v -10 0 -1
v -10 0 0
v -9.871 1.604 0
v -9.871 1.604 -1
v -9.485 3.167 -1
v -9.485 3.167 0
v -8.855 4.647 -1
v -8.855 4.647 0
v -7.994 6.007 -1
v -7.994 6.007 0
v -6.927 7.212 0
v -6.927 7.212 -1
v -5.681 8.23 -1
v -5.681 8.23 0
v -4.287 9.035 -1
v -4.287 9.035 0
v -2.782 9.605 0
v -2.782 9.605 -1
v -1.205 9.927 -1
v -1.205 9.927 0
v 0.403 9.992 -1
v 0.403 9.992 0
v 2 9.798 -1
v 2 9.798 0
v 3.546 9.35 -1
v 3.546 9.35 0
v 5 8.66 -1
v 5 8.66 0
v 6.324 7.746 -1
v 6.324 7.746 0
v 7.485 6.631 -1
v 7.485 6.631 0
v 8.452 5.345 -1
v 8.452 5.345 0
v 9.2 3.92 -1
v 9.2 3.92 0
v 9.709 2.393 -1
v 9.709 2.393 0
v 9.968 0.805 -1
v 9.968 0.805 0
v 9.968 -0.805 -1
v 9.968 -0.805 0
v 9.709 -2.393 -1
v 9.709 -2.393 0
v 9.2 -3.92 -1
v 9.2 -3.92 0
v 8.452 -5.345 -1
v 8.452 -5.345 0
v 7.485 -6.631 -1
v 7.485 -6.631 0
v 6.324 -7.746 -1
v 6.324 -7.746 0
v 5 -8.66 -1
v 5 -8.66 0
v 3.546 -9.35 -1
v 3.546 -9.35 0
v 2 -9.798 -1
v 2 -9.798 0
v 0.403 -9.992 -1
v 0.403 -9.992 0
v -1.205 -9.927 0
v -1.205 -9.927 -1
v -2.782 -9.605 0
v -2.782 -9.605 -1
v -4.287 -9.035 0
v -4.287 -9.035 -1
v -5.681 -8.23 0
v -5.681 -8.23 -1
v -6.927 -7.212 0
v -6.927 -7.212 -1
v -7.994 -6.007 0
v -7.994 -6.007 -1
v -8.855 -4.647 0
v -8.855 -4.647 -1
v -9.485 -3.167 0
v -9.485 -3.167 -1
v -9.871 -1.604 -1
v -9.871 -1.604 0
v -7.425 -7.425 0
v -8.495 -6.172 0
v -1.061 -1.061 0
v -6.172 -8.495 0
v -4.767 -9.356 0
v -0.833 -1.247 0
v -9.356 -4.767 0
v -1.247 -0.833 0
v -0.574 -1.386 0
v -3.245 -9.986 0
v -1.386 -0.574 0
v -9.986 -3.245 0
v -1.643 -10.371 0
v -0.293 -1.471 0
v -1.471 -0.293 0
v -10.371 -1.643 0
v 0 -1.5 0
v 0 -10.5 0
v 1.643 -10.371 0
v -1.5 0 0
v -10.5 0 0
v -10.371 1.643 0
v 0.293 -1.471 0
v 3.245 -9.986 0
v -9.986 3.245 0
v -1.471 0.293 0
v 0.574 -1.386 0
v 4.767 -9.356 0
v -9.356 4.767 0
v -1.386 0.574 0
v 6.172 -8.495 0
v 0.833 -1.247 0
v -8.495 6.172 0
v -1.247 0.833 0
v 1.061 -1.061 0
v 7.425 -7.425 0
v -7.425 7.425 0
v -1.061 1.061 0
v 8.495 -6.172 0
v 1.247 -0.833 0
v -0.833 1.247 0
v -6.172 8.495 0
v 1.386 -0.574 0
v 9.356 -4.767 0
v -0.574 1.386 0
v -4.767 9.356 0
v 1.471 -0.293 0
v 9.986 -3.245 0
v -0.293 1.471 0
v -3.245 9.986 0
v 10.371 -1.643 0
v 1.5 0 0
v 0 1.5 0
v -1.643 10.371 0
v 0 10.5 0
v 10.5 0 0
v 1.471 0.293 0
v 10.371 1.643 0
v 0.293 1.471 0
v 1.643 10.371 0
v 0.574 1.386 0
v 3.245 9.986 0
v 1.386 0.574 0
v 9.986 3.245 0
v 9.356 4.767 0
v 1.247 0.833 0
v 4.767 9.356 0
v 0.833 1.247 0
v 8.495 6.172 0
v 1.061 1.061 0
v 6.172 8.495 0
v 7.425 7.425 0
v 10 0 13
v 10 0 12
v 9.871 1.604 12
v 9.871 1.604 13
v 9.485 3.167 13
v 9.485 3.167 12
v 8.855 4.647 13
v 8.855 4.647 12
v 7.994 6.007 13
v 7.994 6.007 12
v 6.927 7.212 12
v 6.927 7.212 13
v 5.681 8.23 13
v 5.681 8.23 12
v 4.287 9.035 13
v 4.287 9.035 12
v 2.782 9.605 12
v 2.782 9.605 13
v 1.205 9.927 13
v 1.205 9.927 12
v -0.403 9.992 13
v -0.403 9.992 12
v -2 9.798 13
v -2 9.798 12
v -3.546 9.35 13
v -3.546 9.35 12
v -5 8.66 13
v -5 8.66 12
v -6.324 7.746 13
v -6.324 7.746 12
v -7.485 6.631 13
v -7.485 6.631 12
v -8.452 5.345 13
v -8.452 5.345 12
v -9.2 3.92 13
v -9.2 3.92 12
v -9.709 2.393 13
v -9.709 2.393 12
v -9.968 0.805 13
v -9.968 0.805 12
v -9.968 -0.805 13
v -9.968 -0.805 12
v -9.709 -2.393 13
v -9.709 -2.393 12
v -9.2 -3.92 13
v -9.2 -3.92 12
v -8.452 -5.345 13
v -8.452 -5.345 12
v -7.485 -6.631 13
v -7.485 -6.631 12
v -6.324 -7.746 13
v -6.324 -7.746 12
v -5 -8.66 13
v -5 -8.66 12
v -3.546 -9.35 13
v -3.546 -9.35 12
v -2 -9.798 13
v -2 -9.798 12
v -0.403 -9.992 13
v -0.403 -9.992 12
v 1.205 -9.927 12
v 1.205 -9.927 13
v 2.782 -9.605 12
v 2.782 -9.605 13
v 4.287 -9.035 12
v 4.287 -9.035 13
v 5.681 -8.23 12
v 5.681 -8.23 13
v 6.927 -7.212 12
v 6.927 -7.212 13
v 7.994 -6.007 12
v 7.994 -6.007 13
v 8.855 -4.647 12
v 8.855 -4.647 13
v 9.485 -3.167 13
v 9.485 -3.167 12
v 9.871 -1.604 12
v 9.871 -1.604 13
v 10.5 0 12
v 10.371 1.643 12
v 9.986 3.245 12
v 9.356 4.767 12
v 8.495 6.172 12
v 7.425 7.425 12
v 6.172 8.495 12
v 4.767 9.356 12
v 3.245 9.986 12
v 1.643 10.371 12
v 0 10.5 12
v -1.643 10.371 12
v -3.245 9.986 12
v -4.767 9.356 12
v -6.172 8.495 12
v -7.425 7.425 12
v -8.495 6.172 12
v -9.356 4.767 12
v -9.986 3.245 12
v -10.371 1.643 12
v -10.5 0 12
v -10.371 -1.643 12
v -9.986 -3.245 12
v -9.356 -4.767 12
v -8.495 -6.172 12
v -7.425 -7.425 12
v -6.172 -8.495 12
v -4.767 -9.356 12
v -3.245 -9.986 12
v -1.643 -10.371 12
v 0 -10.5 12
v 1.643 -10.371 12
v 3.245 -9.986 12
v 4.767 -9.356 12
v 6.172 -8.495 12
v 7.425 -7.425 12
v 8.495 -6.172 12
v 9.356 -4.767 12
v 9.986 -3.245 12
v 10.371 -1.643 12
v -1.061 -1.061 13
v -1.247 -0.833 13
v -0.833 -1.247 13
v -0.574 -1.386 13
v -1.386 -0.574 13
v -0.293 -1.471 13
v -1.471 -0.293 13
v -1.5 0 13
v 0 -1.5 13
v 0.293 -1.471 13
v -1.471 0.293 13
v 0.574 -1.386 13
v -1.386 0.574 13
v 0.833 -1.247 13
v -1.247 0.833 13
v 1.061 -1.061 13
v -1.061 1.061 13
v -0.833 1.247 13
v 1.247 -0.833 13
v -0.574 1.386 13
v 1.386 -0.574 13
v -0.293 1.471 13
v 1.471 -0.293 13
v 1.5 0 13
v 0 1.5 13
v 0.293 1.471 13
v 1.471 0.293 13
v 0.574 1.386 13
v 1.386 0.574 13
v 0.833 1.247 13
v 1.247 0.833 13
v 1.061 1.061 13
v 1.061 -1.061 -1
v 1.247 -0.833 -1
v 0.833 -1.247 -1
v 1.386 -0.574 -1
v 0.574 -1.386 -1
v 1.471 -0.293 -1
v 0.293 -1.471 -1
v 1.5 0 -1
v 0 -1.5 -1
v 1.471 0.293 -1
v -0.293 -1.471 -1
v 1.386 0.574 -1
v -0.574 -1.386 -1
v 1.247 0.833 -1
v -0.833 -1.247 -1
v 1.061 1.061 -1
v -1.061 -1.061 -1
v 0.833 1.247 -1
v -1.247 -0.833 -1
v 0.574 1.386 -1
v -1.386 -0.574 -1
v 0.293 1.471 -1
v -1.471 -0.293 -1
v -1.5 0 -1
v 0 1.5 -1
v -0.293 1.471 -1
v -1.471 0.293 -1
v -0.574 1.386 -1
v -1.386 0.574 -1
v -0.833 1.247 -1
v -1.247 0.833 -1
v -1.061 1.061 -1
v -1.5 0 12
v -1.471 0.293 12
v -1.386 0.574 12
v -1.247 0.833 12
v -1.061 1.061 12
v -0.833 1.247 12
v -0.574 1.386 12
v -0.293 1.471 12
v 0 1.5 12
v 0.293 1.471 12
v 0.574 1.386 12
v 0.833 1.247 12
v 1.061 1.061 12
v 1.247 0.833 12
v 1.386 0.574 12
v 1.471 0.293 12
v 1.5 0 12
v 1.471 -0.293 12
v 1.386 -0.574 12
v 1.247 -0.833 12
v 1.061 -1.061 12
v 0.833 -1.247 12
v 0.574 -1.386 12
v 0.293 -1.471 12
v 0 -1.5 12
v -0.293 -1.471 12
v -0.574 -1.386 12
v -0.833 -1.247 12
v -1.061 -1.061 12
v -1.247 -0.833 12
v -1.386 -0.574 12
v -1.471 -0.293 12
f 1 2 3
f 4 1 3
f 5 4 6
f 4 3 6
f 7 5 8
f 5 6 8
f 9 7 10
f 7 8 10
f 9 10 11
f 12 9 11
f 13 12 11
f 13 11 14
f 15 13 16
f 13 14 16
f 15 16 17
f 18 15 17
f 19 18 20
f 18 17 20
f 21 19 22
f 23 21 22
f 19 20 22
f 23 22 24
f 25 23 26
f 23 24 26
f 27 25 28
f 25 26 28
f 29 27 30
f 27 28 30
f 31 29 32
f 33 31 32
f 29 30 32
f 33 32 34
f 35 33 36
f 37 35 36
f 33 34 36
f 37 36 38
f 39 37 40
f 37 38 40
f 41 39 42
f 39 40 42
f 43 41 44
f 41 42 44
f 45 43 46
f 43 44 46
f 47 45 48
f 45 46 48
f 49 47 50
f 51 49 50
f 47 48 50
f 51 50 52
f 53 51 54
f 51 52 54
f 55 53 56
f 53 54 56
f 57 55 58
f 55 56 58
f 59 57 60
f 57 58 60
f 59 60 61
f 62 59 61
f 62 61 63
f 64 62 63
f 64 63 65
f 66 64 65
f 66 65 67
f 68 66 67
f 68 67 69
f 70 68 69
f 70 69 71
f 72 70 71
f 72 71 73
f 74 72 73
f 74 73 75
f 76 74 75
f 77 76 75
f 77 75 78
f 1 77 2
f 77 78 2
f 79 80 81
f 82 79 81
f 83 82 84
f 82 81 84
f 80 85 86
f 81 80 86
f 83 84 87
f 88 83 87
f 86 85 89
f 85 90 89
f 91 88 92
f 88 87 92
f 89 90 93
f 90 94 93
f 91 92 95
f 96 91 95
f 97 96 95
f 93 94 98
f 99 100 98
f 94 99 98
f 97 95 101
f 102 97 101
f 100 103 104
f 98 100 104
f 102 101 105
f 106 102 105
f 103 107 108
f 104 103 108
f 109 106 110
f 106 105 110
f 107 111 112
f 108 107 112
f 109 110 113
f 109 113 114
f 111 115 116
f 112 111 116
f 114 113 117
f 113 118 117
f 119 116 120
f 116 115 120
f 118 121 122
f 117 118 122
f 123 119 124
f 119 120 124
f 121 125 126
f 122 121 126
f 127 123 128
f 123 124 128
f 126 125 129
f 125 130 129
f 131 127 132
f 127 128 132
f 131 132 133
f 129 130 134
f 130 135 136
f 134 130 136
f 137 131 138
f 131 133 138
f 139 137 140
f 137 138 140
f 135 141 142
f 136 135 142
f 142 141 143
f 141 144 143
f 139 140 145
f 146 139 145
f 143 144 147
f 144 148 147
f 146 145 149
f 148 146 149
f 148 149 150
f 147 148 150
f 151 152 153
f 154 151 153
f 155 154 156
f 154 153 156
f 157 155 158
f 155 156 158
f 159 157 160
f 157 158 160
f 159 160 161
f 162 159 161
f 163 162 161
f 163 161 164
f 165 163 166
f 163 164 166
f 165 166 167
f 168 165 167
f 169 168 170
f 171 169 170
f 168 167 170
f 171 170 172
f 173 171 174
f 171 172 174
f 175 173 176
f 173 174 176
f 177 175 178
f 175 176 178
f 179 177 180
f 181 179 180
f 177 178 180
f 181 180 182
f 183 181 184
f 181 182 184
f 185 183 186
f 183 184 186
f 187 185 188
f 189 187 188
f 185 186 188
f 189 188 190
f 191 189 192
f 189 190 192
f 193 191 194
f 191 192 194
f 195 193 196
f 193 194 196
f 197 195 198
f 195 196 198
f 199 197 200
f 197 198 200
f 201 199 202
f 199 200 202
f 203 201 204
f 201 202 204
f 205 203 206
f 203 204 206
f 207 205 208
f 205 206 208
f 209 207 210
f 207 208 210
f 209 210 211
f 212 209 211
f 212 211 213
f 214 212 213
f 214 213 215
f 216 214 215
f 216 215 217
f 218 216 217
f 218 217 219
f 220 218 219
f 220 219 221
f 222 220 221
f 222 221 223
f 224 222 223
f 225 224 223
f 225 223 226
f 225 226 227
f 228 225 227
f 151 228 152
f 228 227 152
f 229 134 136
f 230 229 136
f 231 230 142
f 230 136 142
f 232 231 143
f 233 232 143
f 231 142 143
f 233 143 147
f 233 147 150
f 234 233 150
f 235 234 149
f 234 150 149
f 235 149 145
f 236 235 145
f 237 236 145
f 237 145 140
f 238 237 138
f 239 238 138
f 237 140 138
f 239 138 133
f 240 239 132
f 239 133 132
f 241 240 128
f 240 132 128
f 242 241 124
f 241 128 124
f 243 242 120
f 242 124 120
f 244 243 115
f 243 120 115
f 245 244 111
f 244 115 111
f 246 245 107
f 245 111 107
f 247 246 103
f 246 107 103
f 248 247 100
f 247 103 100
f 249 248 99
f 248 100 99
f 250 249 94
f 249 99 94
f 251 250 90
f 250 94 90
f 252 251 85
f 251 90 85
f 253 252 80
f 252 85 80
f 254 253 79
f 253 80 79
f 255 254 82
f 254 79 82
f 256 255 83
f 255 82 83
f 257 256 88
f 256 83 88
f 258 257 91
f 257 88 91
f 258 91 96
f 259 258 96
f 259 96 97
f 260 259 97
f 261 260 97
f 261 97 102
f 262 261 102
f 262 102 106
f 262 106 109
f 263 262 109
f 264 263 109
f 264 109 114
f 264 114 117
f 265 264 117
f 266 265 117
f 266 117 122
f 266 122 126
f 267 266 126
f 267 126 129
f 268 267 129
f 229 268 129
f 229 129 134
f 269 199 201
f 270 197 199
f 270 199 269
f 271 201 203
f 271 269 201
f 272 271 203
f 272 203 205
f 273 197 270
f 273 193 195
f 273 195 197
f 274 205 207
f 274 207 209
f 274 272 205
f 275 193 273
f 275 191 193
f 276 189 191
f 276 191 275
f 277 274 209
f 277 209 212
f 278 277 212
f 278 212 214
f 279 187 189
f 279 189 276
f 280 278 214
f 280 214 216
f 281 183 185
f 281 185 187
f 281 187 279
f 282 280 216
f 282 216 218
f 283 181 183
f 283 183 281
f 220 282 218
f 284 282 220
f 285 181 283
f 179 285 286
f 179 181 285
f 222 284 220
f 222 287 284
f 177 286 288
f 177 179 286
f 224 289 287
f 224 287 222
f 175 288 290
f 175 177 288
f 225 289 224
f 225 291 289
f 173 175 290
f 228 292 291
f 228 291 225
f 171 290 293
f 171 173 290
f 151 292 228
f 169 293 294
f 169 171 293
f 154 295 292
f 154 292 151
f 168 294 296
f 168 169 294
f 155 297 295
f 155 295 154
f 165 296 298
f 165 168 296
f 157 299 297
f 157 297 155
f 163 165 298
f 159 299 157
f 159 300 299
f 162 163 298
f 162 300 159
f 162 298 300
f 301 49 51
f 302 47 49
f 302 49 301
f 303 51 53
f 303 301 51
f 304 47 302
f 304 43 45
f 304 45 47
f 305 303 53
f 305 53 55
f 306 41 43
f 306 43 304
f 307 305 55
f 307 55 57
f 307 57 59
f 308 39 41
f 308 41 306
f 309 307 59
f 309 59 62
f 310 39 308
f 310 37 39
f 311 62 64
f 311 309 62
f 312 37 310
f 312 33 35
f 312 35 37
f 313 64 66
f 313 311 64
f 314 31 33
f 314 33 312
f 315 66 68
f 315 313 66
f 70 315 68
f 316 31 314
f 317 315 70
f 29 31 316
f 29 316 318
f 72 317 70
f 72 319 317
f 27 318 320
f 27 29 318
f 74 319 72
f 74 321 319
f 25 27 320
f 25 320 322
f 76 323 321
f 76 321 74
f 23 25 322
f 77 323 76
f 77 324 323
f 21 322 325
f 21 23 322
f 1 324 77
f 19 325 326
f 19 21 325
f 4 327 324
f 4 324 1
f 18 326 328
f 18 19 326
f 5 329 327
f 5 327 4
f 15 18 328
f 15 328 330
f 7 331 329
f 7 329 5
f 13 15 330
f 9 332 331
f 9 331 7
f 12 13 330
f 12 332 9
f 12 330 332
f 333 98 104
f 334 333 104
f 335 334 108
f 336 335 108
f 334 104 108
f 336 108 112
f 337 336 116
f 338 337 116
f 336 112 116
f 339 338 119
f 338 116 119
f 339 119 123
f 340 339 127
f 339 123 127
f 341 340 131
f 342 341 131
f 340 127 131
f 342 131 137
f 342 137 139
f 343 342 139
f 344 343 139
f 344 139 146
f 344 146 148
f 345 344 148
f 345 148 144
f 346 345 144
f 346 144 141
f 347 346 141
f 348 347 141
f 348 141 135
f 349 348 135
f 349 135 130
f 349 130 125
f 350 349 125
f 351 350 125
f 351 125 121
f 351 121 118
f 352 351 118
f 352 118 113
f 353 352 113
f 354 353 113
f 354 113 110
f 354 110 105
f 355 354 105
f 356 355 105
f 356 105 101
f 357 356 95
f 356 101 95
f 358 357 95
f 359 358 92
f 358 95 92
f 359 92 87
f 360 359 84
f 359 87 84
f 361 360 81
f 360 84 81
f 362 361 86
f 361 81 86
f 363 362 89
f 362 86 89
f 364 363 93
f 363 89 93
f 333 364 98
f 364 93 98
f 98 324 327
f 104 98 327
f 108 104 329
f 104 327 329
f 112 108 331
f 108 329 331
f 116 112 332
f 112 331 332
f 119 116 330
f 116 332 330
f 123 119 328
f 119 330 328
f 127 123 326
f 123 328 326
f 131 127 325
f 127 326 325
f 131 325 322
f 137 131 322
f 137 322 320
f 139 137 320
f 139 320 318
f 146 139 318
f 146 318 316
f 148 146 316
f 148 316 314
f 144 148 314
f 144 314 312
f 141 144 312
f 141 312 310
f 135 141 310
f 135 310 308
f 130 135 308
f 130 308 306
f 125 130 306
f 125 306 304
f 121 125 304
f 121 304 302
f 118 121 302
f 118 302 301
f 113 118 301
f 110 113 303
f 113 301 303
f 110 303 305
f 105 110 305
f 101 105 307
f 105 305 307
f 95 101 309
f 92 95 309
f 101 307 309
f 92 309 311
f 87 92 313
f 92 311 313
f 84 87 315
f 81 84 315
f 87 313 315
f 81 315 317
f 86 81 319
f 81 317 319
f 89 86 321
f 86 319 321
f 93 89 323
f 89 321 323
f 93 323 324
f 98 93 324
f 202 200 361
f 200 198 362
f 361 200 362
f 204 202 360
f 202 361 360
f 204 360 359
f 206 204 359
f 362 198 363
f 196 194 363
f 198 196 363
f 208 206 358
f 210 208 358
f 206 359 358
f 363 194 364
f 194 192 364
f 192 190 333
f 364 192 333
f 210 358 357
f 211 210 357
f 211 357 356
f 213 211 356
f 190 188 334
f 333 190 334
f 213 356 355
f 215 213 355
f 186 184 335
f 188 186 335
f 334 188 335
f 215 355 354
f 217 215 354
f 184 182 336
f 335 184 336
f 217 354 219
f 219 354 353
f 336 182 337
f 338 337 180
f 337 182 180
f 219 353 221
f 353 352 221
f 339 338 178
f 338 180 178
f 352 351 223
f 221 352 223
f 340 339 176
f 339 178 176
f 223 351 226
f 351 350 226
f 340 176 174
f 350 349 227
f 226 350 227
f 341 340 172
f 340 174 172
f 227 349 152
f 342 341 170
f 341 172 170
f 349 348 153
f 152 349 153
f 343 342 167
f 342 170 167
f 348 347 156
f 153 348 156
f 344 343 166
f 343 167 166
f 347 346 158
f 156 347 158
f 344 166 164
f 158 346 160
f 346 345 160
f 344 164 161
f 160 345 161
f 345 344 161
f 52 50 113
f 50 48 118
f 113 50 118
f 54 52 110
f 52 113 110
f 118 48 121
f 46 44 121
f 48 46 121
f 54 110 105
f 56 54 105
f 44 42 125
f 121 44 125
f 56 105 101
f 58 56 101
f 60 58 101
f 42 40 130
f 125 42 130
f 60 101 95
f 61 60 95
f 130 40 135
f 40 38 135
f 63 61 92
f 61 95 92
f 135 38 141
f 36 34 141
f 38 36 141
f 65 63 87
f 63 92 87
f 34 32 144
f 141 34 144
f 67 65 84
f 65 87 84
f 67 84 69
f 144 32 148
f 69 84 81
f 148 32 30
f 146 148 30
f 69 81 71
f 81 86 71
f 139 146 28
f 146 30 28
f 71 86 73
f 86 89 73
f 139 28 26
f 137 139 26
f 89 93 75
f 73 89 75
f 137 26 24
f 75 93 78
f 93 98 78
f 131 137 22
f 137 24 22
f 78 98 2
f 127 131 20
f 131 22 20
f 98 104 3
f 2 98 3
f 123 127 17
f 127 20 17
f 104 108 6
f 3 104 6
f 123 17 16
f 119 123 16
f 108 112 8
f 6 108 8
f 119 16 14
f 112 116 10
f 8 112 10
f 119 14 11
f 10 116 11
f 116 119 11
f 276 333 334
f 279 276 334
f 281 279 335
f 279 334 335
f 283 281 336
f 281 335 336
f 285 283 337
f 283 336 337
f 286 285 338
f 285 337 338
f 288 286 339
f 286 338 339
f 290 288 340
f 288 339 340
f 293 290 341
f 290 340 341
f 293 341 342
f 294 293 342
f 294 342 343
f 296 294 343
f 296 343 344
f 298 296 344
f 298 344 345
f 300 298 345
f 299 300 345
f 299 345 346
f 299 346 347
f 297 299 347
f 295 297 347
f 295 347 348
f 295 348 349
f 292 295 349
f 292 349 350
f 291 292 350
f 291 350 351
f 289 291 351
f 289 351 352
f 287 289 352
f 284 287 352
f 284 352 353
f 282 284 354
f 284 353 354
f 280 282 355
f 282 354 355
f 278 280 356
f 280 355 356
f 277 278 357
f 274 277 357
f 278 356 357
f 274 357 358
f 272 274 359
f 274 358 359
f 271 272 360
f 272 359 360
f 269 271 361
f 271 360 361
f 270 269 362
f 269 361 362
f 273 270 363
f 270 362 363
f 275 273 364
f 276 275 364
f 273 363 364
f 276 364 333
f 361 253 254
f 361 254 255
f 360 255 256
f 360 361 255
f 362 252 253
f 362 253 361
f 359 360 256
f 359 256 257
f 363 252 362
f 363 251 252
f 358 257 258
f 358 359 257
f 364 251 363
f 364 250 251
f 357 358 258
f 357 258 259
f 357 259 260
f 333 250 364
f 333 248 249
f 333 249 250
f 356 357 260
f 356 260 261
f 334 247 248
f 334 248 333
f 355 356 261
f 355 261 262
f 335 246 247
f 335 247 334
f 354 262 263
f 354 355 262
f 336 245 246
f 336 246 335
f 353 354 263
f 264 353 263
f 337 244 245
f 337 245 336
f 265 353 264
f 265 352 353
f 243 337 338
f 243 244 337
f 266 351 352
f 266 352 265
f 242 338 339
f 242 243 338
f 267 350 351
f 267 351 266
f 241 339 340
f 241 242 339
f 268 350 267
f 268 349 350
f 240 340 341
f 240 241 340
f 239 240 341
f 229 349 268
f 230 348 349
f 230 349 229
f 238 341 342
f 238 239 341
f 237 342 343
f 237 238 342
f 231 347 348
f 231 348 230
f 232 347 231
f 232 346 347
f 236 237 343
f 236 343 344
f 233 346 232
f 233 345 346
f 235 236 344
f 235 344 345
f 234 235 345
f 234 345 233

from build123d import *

# Parameters (mm, degrees)
CROQUIS1_R              = 10.5
SALIENTE_EXTRUIR1_DEPTH = 12
CROQUIS2_R              = 10
SALIENTE_EXTRUIR2_DEPTH = 1
CROQUIS3_R              = 10
SALIENTE_EXTRUIR3_DEPTH = 1
CROQUIS4_R              = 1.5
CORTAR_EXTRUIR1_DEPTH   = 21.408331632


with BuildPart() as part:
    # Croquis1 → Saliente-Extruir1 (new body)
    with BuildSketch(Plane.XY):
        Circle(CROQUIS1_R)
    extrude(amount=SALIENTE_EXTRUIR1_DEPTH)


with BuildPart() as body_2:
    # Croquis2 → Saliente-Extruir2 (new body)
    with BuildSketch(Plane.XY.offset(12)):
        Circle(CROQUIS2_R)
    extrude(amount=SALIENTE_EXTRUIR2_DEPTH)


with BuildPart() as body_3:
    # Croquis3 → Saliente-Extruir3 (new body)
    with BuildSketch(Plane(origin=(0, 0, 0), x_dir=(-1, 0, 0), z_dir=(0, 0, -1))):
        Circle(CROQUIS3_R)
    extrude(amount=SALIENTE_EXTRUIR3_DEPTH)


with BuildPart() as cortar_extruir1_tool:
    # Croquis4 → Cortar-Extruir1 (new, through all)
    with BuildSketch(Plane(origin=(0, 0, -1), x_dir=(-1, 0, 0), z_dir=(0, 0, -1))):
        Circle(CROQUIS4_R)
    extrude(amount=-CORTAR_EXTRUIR1_DEPTH)


with BuildPart() as part_1:
    add(part.part)

    # Cortar-Extruir1: cut by cortar_extruir1_tool
    add(cortar_extruir1_tool.part, mode=Mode.SUBTRACT)


with BuildPart() as body_2_1:
    add(body_2.part)

    # Cortar-Extruir1: cut by cortar_extruir1_tool
    add(cortar_extruir1_tool.part, mode=Mode.SUBTRACT)


with BuildPart() as body_3_1:
    add(body_3.part)

    # Cortar-Extruir1: cut by cortar_extruir1_tool
    add(cortar_extruir1_tool.part, mode=Mode.SUBTRACT)


solid = Compound([part_1.part, body_2_1.part, body_3_1.part])
